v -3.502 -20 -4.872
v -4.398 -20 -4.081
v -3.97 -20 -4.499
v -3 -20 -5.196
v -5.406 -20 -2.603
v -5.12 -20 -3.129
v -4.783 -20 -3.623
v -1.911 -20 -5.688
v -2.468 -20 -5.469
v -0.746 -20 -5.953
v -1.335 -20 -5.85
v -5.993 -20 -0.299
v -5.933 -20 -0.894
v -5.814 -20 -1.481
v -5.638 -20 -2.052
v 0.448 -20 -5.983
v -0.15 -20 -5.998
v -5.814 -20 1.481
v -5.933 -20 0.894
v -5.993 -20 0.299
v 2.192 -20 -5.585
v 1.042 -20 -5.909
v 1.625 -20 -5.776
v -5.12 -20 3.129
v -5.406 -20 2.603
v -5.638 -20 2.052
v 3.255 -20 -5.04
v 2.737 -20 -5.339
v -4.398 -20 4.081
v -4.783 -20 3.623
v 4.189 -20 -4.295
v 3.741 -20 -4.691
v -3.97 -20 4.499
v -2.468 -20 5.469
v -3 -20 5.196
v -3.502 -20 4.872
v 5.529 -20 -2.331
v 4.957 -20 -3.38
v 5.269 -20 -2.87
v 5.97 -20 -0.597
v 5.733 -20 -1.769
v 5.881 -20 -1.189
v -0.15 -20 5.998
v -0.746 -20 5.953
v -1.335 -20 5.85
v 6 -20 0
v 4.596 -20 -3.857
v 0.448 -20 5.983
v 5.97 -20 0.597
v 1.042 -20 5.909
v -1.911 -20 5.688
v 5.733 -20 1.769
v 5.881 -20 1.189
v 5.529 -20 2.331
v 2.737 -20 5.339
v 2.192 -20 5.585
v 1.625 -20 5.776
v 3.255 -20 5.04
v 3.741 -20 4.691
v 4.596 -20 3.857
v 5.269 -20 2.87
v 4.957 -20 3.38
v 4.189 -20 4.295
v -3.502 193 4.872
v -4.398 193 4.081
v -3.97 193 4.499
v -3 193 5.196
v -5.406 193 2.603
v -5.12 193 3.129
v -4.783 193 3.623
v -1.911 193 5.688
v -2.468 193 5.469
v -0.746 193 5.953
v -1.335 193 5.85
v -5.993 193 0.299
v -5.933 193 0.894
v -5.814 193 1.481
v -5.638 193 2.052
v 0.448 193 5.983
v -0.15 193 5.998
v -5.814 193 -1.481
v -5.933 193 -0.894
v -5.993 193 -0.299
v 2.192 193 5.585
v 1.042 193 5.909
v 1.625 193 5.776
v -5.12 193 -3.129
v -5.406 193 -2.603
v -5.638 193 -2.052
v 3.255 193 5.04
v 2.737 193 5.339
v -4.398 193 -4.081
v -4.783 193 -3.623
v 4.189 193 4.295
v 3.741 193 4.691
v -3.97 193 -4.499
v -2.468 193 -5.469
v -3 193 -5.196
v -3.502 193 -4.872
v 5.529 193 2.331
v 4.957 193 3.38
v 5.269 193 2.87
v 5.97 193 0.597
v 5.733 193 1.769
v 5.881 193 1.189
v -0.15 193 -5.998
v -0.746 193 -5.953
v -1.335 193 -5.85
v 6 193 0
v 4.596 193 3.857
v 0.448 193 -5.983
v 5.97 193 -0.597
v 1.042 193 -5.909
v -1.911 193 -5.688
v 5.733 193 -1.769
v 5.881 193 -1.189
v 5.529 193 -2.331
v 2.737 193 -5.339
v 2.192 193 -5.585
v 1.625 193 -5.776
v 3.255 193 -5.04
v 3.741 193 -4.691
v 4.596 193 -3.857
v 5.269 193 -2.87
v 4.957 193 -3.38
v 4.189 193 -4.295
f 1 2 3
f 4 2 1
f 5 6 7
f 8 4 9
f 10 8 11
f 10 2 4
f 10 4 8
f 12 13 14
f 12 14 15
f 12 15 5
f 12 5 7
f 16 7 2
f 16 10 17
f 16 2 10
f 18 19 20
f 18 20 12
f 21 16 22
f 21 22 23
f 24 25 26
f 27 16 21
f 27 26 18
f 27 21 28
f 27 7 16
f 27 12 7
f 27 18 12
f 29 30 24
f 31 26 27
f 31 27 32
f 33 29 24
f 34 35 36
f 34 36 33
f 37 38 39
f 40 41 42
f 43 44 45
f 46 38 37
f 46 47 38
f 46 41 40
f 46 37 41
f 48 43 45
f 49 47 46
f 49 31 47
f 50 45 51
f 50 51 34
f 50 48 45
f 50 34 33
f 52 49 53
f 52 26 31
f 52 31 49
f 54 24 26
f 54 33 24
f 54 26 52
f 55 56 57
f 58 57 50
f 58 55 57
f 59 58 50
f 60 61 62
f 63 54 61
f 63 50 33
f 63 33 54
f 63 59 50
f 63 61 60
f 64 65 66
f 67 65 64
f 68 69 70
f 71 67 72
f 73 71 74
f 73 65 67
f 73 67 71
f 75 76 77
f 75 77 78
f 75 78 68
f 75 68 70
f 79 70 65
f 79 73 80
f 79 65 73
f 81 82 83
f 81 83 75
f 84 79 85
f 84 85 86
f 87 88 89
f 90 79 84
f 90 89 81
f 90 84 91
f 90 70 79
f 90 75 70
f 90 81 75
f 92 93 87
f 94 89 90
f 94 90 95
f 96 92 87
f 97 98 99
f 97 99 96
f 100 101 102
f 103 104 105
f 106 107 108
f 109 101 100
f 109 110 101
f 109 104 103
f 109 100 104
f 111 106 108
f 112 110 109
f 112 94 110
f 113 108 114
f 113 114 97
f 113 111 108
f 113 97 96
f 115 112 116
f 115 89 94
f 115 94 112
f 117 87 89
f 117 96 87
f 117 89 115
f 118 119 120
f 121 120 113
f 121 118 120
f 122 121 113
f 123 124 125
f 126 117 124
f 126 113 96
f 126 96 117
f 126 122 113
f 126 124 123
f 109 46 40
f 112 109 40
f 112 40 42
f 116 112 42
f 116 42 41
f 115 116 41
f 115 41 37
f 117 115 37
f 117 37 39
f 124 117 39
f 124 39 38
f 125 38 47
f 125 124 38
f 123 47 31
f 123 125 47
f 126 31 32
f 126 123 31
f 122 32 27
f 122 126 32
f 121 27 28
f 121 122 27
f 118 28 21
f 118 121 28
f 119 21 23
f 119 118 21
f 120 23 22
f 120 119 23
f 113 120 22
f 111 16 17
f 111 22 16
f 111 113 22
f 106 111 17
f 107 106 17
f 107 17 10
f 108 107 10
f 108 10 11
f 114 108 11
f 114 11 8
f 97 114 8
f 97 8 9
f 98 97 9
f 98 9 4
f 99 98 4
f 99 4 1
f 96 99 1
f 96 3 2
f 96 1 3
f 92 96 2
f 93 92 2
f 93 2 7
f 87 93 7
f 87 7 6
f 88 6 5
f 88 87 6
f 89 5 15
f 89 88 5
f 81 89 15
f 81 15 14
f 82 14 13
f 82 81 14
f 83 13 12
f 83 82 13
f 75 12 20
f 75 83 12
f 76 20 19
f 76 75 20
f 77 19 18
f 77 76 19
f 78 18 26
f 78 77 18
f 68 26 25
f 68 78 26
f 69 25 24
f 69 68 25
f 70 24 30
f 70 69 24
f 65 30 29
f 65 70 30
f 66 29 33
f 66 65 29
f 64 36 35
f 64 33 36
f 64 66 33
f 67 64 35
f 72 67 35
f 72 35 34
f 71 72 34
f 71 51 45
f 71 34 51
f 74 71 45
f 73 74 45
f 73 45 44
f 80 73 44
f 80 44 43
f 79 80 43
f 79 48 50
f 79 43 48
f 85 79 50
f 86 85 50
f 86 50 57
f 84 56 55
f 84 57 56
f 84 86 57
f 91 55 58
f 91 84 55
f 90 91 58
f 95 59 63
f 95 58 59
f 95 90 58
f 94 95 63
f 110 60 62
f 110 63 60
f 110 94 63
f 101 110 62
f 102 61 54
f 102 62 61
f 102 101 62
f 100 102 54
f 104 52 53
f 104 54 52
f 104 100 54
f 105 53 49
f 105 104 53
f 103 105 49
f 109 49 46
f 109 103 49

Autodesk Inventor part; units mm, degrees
ref_plane "YZ Plane" through (0, 0, 0) normal (1, 0, 0) x (0, 1, 0)
ref_plane "XZ Plane" through (0, 0, 0) normal (0, 1, 0) x (-1, 0, 0)
ref_plane "XY Plane" through (0, 0, 0) normal (0, 0, 1) x (1, 0, 0)
sketch "スケッチ1" plane through (0, 0, 0) normal (0, 1, 0) x (-1, 0, 0)
  circle A0 centre (0, 0) radius 5
  dimension "d0" = 10
extrude "押し出し1" add sketch "スケッチ1" along normal blind 193
sketch "スケッチ2" plane through (0, 193, 0) normal (0, 1, 0) x (1, 0, 0)
  circle A0 centre (0, 0) radius 4
  circle A1 centre (0, 0) radius 5
  dimension "d3" = 8
  dimension "d4" = 10
extrude "押し出し2" cut sketch "スケッチ2" against normal blind 193
sketch "スケッチ3" plane through (0, 193, 0) normal (0, 1, 0) x (1, 0, 0)
  circle A0 centre (0, 0) radius 6
  circle A1 centre (0, 0) radius 4
  dimension "d7" = 12
  dimension "d9" = 8
extrude "押し出し3" add sketch "スケッチ3" against normal blind 193
sketch "スケッチ4" plane through (0, 0, 0) normal (0, -1, 0) x (1, 0, 0)
  circle A0 centre (0, 0) radius 6
  dimension "d12" = 12
extrude "押し出し4" add sketch "スケッチ4" along normal blind 20
properties part number "射出_軸" material "アルミニウム 6061"
